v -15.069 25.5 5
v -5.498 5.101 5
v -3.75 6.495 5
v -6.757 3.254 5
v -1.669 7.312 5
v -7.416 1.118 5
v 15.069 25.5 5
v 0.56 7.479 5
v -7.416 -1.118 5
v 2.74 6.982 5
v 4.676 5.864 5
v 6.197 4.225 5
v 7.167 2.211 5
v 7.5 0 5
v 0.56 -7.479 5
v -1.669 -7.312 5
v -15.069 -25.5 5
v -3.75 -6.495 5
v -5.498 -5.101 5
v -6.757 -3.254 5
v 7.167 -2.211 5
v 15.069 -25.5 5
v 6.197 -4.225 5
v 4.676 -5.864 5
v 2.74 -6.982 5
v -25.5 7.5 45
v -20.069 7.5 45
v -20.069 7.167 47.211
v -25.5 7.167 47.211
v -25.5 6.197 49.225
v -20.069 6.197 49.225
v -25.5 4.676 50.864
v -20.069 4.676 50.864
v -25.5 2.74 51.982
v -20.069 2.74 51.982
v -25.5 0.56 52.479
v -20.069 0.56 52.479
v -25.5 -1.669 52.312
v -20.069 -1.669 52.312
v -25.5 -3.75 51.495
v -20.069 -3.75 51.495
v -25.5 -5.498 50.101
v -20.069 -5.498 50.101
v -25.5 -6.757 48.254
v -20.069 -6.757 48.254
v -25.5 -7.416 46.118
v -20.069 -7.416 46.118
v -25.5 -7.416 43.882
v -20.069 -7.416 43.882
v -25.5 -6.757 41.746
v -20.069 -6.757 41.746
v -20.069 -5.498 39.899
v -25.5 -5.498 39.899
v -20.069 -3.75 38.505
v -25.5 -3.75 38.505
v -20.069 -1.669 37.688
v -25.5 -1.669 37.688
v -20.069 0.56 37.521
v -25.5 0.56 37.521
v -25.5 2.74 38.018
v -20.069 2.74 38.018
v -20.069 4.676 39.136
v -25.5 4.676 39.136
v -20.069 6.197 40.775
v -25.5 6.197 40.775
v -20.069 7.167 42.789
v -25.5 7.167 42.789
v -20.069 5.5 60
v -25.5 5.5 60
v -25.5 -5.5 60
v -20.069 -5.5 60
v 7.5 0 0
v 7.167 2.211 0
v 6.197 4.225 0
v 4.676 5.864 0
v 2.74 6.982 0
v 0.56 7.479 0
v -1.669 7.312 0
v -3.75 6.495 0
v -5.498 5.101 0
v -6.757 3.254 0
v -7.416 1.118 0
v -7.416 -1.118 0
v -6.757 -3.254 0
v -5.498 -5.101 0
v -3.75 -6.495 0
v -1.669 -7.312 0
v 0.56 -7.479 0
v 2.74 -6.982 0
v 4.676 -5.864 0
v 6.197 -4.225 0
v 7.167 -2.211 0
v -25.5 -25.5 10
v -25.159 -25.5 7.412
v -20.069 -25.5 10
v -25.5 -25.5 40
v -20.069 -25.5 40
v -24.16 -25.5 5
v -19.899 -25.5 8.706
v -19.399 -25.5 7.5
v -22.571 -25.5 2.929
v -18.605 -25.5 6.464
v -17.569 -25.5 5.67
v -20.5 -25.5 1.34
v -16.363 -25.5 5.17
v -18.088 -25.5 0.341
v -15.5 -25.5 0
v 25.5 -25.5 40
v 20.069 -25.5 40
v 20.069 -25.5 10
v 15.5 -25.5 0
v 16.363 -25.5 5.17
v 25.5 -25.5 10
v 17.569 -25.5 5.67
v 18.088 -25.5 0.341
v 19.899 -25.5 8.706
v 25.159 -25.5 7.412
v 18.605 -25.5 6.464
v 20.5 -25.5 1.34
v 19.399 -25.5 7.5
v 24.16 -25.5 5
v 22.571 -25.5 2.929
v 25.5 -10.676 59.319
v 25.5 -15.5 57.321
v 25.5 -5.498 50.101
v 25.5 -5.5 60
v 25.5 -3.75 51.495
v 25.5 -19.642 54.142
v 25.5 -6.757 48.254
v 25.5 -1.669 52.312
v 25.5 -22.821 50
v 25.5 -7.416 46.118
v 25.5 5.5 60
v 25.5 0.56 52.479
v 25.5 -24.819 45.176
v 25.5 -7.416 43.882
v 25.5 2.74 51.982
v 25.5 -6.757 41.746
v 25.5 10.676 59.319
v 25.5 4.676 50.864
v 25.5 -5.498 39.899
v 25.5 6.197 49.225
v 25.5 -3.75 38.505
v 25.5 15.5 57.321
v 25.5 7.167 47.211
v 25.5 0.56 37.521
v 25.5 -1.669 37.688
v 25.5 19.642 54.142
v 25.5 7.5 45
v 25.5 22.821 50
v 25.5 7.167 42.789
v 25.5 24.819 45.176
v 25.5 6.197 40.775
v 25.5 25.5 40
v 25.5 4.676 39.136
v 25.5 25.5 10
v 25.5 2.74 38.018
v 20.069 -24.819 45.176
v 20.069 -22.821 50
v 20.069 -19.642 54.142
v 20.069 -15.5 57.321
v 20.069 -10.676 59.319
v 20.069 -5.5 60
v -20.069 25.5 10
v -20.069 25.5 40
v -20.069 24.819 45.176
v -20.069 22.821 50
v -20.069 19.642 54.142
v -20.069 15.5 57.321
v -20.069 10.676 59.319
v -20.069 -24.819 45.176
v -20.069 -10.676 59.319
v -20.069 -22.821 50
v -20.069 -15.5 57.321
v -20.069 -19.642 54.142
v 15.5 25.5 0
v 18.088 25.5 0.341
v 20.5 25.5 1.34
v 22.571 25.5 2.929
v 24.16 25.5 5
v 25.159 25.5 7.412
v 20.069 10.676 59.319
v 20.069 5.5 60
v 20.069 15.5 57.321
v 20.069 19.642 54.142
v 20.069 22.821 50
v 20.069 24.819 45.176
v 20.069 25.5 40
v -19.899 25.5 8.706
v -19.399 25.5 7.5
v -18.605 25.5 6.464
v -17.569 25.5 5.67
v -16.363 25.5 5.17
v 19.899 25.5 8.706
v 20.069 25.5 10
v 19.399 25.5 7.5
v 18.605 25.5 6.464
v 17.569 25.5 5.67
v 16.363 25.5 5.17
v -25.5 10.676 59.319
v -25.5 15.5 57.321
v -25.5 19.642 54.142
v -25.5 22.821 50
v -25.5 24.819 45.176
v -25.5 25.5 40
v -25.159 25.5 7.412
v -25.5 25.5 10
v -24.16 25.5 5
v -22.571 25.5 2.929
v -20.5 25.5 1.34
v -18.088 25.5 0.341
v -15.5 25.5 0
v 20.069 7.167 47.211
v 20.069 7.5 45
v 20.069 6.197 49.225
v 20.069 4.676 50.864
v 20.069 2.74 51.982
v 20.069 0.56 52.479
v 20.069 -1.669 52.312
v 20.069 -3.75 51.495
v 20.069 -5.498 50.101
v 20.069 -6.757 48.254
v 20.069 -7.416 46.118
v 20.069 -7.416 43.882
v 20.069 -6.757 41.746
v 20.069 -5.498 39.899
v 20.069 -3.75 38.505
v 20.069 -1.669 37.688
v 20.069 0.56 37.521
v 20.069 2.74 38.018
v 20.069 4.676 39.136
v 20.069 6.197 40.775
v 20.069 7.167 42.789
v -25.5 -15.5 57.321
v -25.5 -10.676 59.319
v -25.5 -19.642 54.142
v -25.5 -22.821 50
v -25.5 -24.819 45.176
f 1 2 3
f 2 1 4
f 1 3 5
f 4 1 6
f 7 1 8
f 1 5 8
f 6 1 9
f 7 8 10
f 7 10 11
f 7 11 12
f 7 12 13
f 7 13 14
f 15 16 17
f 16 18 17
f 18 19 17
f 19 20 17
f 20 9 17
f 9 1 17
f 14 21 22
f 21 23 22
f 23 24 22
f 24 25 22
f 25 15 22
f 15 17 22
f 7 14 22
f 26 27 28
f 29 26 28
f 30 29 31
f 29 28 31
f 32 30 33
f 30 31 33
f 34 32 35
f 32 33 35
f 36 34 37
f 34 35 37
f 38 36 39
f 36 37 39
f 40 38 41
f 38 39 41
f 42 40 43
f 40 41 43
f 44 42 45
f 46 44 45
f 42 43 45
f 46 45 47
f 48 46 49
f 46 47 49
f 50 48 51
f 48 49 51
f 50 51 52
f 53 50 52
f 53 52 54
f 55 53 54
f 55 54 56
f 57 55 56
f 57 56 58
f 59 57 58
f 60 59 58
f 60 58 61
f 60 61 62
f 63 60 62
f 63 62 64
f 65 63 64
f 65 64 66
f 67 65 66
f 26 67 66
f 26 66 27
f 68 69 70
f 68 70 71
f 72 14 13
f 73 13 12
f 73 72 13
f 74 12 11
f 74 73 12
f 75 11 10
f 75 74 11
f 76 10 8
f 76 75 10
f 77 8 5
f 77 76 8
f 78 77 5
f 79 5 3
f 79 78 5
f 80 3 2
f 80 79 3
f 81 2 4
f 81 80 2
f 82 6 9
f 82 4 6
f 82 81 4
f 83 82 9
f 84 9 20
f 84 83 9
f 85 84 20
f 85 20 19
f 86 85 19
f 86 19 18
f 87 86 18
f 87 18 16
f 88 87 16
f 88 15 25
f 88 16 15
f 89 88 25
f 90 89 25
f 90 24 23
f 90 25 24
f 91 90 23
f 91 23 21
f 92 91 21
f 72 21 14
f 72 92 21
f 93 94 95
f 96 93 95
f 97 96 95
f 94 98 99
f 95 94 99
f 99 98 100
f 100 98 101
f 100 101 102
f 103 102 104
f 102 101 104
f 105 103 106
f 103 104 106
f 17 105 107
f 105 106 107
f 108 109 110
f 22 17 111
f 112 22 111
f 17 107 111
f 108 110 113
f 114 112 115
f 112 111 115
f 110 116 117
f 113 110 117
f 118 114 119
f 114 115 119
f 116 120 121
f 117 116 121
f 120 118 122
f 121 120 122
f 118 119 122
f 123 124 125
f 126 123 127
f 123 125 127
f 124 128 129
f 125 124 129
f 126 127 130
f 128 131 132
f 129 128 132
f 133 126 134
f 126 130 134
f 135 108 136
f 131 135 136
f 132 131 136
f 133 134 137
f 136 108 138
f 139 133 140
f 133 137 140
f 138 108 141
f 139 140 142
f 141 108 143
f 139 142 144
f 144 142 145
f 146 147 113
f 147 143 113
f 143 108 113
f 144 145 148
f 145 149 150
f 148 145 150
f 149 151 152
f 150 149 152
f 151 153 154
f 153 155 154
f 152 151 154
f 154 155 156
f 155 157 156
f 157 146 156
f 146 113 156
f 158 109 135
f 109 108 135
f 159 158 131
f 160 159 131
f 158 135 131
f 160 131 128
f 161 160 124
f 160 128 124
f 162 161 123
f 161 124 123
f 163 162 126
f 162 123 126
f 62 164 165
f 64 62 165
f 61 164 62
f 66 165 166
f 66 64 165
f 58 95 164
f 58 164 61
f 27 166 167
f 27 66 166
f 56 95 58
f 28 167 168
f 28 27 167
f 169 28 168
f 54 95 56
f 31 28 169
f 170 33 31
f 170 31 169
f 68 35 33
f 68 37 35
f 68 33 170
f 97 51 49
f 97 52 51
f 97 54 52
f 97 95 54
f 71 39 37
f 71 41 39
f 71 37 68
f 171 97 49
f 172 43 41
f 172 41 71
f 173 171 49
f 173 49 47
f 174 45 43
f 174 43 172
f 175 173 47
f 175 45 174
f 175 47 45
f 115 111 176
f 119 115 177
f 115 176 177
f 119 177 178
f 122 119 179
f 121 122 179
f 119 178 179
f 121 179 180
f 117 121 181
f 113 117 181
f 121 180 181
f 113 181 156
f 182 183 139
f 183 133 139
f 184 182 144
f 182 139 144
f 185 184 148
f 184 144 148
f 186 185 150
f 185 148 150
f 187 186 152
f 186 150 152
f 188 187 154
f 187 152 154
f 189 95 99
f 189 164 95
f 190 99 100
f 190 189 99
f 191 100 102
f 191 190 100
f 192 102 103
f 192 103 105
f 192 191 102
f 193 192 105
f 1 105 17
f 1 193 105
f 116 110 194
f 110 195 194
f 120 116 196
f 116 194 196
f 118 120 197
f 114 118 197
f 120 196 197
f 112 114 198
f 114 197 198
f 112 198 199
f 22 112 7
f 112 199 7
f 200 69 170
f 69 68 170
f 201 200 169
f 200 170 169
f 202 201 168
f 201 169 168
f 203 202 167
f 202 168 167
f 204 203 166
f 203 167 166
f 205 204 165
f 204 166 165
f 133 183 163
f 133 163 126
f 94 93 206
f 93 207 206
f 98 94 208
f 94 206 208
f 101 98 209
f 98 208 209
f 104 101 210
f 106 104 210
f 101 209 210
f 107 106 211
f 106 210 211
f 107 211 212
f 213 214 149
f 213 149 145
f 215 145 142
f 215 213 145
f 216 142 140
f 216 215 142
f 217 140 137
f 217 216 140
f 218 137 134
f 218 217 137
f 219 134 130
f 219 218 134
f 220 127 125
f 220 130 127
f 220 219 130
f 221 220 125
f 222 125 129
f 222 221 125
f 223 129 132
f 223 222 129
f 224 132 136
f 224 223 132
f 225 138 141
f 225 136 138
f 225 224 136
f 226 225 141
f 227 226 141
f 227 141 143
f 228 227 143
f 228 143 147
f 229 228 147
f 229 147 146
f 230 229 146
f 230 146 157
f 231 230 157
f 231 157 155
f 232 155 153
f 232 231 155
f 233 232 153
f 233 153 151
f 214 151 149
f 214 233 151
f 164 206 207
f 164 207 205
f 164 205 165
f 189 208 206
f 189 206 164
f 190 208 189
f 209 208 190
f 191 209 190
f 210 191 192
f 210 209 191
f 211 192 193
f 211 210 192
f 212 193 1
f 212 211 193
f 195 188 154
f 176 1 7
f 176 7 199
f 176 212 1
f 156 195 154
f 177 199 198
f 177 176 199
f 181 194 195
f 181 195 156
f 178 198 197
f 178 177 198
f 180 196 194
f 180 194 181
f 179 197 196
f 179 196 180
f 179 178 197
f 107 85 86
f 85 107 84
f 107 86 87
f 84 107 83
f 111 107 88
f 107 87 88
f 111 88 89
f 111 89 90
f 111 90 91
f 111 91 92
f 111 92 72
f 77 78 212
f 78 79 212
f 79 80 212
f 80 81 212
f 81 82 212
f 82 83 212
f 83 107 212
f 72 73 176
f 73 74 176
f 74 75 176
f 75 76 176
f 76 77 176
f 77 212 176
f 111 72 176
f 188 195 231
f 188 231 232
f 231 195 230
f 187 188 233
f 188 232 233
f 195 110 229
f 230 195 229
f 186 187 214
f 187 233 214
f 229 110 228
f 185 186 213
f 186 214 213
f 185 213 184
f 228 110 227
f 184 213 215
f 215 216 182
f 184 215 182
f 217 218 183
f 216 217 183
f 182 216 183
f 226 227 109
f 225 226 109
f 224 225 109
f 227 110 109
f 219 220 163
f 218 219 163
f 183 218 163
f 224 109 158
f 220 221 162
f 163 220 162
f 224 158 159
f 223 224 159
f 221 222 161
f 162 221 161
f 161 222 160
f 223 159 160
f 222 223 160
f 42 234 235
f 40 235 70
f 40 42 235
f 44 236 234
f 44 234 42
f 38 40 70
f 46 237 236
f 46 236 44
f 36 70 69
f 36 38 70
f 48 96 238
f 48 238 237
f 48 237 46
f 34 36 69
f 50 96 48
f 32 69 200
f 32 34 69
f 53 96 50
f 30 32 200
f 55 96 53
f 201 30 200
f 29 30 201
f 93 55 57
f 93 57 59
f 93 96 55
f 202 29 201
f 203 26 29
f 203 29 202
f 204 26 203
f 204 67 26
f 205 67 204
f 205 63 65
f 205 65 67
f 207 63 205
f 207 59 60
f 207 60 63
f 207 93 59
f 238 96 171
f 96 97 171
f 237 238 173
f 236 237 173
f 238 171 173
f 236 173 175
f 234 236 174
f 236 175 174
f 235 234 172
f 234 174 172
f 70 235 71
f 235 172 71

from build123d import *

# Parameters (mm, degrees)
F0_W          = 51
F0_H          = 51
F1_DEPTH      = 60
F2_W          = 40.138214
F2_H          = 55
F3_DEPTH      = 51
F4_R          = 7.5
F5_DEPTH      = 60.001
F6_R          = 7.5
F7_DEPTH      = 25.501
F7_DEPTH_BACK = 88.263765
F8_R          = 10
F9_R          = 5
F10_R         = 20


with BuildPart() as f1:
    # F0 (on Top) → F1 (new body)
    with BuildSketch(Plane.XY):
        Rectangle(F0_W, F0_H)
    extrude(amount=F1_DEPTH)

    # F2 (on face) → F3 (cut)
    with BuildSketch(Plane.XZ.offset(25.5)):
        with Locations((0, 32.5)):
            Rectangle(F2_W, F2_H)
    extrude(amount=-F3_DEPTH, mode=Mode.SUBTRACT)

    # F4 (on Top) → F5 (cut, through all)
    with BuildSketch(Plane.XY):
        Circle(F4_R)
    extrude(amount=F5_DEPTH, mode=Mode.SUBTRACT)

    # F6 (on Right) → F7 (cut, two sides)
    with BuildSketch(Plane.YZ) as f7_sk:
        with Locations((0, 45)):
            Circle(F6_R)
    extrude(amount=F7_DEPTH, mode=Mode.SUBTRACT)
    extrude(f7_sk.sketch, amount=-F7_DEPTH_BACK, mode=Mode.SUBTRACT)

    # F8
    f8_edges = [f1.edges().sort_by_distance(p)[0] for p in [
        (-25.5, 0, 0),
        (25.5, 0, 0),
    ]]
    fillet(f8_edges, radius=F8_R)

    # F9
    f9_edges = [f1.edges().sort_by_distance(p)[0] for p in [
        (-20.069107, 0, 5),
        (20.069107, 0, 5),
    ]]
    fillet(f9_edges, radius=F9_R)

    # F10
    f10_edges = [f1.edges().sort_by_distance(p)[0] for p in [
        (22.784554, 25.5, 60),
        (-22.784554, 25.5, 60),
        (22.784554, -25.5, 60),
        (-22.784554, -25.5, 60),
    ]]
    fillet(f10_edges, radius=F10_R)


solid = f1.part
